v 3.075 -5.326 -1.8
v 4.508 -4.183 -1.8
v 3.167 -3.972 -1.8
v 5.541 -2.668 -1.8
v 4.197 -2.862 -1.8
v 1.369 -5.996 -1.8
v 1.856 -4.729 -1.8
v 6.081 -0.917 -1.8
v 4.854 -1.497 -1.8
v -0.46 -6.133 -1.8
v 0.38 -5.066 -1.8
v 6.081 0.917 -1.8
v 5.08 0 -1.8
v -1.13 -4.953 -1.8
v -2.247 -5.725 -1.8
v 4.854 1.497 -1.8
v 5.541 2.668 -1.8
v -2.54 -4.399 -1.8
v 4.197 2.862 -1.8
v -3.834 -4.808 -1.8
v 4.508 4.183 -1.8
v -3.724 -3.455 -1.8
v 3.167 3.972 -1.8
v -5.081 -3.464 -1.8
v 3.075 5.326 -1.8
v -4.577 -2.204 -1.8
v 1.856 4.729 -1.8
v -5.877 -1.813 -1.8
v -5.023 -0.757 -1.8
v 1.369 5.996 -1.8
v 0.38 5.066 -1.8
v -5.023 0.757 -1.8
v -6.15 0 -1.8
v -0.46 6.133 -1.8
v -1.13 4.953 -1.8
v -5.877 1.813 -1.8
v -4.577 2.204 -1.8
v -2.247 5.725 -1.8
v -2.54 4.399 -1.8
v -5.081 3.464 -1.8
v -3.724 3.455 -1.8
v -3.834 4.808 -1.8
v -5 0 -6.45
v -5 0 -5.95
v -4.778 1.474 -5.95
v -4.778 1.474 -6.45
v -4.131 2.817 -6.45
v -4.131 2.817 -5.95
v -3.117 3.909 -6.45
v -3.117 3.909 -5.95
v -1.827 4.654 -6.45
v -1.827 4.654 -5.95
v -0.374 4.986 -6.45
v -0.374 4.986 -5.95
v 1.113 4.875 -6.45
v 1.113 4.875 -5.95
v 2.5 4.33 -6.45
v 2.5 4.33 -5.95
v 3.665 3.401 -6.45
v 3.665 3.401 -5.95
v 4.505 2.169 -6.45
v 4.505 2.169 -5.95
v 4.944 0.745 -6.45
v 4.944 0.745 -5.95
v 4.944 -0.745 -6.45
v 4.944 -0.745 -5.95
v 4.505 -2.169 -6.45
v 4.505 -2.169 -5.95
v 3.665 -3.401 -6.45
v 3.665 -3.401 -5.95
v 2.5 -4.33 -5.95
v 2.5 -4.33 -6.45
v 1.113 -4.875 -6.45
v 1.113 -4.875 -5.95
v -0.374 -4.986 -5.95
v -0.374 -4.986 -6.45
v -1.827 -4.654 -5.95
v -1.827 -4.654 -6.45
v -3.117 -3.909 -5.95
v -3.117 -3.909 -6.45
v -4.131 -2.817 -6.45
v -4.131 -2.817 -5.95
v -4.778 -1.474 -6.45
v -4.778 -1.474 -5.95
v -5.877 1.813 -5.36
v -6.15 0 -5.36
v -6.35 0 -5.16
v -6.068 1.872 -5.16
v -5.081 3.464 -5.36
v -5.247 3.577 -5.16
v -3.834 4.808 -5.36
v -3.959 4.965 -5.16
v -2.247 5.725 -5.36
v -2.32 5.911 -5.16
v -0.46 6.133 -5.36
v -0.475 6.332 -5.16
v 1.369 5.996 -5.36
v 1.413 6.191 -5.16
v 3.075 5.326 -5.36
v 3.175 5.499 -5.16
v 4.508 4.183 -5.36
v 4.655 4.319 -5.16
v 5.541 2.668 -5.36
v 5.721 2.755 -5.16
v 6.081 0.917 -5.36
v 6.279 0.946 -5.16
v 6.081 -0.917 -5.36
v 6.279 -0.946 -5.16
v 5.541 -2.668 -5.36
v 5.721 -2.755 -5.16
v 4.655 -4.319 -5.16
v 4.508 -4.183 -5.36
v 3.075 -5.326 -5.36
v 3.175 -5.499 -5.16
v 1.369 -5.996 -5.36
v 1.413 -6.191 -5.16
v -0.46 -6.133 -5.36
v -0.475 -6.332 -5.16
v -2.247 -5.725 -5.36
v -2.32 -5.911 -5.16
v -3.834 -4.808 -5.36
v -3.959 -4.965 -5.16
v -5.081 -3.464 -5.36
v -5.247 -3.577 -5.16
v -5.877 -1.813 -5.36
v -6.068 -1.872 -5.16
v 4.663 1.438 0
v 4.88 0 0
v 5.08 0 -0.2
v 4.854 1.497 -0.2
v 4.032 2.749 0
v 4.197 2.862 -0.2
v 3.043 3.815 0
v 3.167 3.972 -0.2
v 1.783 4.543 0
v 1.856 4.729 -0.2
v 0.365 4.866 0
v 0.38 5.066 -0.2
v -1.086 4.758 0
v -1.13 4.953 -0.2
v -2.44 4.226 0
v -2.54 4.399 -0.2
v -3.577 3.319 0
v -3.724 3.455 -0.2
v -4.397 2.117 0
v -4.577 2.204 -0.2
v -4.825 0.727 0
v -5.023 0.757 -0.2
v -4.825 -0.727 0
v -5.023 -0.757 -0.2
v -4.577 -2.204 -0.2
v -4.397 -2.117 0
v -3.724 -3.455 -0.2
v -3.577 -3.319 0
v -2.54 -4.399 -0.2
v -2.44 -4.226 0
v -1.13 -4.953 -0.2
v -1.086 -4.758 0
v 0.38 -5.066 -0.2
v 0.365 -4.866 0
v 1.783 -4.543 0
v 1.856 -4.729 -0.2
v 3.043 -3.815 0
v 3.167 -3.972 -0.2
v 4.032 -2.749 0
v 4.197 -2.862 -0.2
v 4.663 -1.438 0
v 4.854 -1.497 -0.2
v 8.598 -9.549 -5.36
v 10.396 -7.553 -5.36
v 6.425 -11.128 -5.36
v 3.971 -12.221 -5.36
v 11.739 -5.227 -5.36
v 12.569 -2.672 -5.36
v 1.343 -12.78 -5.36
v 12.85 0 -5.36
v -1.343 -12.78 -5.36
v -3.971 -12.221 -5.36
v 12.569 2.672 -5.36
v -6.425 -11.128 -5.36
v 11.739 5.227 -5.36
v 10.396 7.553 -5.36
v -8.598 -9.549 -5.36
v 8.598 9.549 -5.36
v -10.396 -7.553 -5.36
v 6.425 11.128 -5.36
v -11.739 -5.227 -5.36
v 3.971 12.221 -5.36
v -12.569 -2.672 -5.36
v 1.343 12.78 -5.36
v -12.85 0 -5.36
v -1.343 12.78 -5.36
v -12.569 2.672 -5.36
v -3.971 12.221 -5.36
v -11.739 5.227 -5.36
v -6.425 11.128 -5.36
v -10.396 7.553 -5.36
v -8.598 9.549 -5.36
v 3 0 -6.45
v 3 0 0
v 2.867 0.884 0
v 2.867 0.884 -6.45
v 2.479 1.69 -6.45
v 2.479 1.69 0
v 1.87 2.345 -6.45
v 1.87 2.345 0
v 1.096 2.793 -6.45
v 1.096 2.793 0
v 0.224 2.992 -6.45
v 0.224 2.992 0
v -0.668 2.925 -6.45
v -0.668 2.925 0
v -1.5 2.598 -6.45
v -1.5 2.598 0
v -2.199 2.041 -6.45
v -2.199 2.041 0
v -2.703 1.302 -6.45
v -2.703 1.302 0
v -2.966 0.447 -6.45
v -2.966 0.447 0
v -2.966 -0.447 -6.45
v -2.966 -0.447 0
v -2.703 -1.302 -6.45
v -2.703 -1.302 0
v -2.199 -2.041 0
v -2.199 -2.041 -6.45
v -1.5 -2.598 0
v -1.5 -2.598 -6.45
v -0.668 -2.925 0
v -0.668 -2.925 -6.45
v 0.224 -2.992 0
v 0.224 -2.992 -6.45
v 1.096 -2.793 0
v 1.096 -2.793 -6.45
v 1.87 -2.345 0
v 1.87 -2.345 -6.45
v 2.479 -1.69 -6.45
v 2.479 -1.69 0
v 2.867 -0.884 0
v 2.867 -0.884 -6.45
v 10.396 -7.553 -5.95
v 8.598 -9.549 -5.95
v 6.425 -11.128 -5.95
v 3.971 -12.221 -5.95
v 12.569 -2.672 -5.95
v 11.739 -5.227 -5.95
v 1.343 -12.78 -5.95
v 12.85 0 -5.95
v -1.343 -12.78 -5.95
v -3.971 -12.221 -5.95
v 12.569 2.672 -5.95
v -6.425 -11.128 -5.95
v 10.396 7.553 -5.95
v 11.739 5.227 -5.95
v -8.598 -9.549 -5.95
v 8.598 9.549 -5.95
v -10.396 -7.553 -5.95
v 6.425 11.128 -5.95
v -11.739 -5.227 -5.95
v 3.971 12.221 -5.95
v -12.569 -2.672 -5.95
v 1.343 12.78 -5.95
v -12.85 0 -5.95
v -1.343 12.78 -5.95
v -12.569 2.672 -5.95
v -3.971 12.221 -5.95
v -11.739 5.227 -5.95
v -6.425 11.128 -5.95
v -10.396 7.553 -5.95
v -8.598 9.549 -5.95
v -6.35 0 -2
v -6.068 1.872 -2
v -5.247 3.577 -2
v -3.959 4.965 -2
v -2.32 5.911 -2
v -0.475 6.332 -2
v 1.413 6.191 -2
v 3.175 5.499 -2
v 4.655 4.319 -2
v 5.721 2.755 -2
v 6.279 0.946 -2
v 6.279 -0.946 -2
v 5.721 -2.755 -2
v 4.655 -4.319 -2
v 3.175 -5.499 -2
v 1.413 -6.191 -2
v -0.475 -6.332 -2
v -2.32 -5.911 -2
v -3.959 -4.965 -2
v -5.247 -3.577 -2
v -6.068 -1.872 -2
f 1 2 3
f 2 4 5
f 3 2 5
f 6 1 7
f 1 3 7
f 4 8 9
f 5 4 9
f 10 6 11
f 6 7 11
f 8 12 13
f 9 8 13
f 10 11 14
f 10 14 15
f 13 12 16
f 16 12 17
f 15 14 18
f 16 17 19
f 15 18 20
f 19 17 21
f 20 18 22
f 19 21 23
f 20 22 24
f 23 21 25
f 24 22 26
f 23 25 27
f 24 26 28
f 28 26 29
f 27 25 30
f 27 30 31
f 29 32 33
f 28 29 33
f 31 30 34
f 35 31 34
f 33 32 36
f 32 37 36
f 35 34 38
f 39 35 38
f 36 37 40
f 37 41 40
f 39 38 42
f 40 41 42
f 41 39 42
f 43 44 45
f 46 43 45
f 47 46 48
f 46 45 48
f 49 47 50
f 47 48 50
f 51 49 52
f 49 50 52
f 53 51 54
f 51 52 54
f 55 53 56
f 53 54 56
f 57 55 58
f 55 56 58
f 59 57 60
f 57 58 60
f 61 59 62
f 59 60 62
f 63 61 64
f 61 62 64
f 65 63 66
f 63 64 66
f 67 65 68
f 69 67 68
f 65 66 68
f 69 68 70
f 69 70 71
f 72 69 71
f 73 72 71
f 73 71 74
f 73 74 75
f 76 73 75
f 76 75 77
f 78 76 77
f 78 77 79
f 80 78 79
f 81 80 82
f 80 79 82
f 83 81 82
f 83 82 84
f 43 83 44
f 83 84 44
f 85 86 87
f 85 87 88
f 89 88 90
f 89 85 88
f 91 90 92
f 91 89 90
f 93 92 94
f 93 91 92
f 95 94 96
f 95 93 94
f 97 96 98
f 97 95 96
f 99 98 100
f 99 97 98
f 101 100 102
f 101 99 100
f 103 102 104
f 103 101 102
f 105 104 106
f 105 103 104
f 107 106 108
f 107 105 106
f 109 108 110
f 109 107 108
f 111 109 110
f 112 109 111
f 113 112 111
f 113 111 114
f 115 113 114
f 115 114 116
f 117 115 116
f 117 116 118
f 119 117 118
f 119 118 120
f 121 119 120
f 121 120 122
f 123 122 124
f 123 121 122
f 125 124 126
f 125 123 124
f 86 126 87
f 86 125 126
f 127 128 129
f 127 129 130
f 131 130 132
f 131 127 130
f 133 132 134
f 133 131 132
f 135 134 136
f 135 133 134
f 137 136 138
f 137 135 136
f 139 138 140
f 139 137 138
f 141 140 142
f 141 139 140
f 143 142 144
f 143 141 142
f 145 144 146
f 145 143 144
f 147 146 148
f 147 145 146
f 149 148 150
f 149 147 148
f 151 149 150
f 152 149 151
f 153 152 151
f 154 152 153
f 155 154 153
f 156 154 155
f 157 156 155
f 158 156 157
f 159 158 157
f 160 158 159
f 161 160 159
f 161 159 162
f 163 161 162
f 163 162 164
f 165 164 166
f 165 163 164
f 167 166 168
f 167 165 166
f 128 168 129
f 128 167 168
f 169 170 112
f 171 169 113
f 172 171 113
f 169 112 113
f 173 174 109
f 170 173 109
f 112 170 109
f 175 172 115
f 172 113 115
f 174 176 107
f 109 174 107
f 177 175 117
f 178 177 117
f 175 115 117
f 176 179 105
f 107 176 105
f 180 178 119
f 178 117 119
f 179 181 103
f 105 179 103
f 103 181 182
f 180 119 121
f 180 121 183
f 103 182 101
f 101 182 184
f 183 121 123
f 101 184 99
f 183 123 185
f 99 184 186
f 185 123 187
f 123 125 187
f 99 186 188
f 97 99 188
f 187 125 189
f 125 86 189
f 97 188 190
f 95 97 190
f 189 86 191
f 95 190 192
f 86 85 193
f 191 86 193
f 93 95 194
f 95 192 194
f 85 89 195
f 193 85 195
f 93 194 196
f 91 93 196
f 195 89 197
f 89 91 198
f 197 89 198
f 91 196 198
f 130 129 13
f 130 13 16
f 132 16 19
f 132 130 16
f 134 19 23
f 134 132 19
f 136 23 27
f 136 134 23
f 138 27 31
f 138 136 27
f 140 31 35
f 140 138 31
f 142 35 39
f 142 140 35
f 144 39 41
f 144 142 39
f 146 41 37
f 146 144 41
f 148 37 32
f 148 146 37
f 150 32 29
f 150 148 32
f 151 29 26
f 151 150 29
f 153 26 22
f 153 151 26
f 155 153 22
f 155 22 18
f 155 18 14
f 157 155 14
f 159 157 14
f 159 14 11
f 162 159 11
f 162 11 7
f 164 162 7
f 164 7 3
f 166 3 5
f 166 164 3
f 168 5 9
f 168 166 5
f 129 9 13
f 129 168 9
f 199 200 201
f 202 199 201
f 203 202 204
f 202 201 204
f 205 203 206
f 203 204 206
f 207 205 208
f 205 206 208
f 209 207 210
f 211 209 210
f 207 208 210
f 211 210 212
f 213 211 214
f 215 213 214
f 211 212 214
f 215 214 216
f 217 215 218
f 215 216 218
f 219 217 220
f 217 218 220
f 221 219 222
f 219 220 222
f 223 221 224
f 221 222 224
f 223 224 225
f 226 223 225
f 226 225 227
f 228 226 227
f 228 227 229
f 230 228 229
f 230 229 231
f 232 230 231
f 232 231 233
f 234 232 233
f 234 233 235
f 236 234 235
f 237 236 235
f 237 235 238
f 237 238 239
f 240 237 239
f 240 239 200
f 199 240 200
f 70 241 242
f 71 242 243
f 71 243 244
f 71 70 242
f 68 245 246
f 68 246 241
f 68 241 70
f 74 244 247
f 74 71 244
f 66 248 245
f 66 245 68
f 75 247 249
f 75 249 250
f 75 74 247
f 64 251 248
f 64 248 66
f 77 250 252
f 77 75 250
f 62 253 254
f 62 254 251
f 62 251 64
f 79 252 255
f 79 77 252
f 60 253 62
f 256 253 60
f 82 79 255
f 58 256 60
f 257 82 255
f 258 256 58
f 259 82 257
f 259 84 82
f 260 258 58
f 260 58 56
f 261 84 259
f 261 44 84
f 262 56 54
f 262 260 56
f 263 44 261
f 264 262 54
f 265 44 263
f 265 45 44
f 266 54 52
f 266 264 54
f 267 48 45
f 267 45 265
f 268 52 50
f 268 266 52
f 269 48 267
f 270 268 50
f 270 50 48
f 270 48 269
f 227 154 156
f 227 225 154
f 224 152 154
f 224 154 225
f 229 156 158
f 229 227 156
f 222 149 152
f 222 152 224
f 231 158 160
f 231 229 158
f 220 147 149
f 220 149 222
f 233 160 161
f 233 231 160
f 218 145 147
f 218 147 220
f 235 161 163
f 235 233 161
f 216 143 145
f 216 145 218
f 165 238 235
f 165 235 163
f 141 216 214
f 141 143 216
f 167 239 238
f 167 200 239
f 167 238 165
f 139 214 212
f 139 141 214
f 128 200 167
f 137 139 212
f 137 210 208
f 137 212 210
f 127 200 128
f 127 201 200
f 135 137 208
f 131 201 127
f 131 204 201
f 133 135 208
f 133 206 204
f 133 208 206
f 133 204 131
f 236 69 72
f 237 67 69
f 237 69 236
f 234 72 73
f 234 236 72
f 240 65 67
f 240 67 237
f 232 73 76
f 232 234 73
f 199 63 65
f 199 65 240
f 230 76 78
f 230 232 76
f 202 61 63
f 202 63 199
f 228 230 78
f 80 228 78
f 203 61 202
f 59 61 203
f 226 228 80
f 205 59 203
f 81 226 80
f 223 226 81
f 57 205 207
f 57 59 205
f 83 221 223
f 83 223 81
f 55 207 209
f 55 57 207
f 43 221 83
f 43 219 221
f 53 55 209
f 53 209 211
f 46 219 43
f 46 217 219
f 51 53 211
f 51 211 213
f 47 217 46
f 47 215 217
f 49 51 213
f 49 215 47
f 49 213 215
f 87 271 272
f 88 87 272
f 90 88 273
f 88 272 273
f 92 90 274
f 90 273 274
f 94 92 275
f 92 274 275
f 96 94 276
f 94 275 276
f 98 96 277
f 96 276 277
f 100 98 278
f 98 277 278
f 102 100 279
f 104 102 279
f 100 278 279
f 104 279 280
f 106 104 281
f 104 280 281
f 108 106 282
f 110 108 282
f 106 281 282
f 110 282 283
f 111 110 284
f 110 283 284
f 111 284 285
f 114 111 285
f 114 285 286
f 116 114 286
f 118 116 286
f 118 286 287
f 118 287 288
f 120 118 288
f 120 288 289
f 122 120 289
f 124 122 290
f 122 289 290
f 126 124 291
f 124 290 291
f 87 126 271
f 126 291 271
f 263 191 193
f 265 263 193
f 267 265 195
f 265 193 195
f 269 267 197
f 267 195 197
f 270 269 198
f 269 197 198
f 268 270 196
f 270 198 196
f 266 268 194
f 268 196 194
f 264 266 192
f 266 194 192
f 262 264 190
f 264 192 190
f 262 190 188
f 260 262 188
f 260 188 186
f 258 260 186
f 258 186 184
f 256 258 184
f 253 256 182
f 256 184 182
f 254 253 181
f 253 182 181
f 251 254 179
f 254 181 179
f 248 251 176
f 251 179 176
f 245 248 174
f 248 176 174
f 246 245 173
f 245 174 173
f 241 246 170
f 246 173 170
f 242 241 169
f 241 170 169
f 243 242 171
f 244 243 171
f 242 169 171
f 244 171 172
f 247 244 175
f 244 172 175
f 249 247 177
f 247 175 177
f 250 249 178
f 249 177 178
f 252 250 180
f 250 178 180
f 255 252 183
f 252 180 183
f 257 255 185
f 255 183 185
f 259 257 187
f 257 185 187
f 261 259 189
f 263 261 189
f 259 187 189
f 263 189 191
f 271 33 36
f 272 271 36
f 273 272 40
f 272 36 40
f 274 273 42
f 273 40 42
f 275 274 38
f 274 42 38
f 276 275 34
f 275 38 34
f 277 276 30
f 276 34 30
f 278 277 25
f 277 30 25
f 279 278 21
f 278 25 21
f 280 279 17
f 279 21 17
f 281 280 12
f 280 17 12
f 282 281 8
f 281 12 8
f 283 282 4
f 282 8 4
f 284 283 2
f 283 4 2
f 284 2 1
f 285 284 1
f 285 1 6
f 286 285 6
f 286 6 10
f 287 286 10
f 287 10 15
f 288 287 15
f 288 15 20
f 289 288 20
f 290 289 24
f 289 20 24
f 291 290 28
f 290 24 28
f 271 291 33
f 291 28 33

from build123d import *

# Parameters (mm, degrees)
SKETCH1_R           = 5.08
BOSS_EXTRUDE1_DEPTH = 1.8
SKETCH2_R           = 6.35
BOSS_EXTRUDE2_DEPTH = 3.56
CHAMFER1_SIZE       = 0.2
SKETCH3_R           = 12.85
BOSS_EXTRUDE3_DEPTH = 0.59
SKETCH4_R           = 5
BOSS_EXTRUDE4_DEPTH = 0.5
SKETCH5_R           = 3
CUT_EXTRUDE1_DEPTH  = 7.45


with BuildPart() as part:
    # Sketch1 → Boss-Extrude1 (new body)
    with BuildSketch(Plane.XY):
        Circle(SKETCH1_R)
    extrude(amount=-BOSS_EXTRUDE1_DEPTH)

    # Sketch2 → Boss-Extrude2 (add)
    with BuildSketch(Plane(origin=(0, 0, -1.8), x_dir=(-1, 0, 0), z_dir=(0, 0, -1))):
        Circle(SKETCH2_R)
    extrude(amount=BOSS_EXTRUDE2_DEPTH)

    # Chamfer1
    chamfer1_edges = [part.edges().sort_by_distance(p)[0] for p in [
        (-5.08, 0, 0),
        (6.35, 0, -1.8),
        (6.35, 0, -5.36),
    ]]
    chamfer(chamfer1_edges, length=CHAMFER1_SIZE)

    # Sketch3 → Boss-Extrude3 (add)
    with BuildSketch(Plane(origin=(0, 0, -5.36), x_dir=(-1, 0, 0), z_dir=(0, 0, -1))):
        Circle(SKETCH3_R)
    extrude(amount=BOSS_EXTRUDE3_DEPTH)

    # Sketch4 → Boss-Extrude4 (add)
    with BuildSketch(Plane(origin=(0, 0, -5.95), x_dir=(-1, 0, 0), z_dir=(0, 0, -1))):
        Circle(SKETCH4_R)
    extrude(amount=BOSS_EXTRUDE4_DEPTH)

    # Sketch5 → Cut-Extrude1 (cut, through all)
    with BuildSketch(Plane.XY):
        Circle(SKETCH5_R)
    extrude(amount=-CUT_EXTRUDE1_DEPTH, mode=Mode.SUBTRACT)


solid = part.part
